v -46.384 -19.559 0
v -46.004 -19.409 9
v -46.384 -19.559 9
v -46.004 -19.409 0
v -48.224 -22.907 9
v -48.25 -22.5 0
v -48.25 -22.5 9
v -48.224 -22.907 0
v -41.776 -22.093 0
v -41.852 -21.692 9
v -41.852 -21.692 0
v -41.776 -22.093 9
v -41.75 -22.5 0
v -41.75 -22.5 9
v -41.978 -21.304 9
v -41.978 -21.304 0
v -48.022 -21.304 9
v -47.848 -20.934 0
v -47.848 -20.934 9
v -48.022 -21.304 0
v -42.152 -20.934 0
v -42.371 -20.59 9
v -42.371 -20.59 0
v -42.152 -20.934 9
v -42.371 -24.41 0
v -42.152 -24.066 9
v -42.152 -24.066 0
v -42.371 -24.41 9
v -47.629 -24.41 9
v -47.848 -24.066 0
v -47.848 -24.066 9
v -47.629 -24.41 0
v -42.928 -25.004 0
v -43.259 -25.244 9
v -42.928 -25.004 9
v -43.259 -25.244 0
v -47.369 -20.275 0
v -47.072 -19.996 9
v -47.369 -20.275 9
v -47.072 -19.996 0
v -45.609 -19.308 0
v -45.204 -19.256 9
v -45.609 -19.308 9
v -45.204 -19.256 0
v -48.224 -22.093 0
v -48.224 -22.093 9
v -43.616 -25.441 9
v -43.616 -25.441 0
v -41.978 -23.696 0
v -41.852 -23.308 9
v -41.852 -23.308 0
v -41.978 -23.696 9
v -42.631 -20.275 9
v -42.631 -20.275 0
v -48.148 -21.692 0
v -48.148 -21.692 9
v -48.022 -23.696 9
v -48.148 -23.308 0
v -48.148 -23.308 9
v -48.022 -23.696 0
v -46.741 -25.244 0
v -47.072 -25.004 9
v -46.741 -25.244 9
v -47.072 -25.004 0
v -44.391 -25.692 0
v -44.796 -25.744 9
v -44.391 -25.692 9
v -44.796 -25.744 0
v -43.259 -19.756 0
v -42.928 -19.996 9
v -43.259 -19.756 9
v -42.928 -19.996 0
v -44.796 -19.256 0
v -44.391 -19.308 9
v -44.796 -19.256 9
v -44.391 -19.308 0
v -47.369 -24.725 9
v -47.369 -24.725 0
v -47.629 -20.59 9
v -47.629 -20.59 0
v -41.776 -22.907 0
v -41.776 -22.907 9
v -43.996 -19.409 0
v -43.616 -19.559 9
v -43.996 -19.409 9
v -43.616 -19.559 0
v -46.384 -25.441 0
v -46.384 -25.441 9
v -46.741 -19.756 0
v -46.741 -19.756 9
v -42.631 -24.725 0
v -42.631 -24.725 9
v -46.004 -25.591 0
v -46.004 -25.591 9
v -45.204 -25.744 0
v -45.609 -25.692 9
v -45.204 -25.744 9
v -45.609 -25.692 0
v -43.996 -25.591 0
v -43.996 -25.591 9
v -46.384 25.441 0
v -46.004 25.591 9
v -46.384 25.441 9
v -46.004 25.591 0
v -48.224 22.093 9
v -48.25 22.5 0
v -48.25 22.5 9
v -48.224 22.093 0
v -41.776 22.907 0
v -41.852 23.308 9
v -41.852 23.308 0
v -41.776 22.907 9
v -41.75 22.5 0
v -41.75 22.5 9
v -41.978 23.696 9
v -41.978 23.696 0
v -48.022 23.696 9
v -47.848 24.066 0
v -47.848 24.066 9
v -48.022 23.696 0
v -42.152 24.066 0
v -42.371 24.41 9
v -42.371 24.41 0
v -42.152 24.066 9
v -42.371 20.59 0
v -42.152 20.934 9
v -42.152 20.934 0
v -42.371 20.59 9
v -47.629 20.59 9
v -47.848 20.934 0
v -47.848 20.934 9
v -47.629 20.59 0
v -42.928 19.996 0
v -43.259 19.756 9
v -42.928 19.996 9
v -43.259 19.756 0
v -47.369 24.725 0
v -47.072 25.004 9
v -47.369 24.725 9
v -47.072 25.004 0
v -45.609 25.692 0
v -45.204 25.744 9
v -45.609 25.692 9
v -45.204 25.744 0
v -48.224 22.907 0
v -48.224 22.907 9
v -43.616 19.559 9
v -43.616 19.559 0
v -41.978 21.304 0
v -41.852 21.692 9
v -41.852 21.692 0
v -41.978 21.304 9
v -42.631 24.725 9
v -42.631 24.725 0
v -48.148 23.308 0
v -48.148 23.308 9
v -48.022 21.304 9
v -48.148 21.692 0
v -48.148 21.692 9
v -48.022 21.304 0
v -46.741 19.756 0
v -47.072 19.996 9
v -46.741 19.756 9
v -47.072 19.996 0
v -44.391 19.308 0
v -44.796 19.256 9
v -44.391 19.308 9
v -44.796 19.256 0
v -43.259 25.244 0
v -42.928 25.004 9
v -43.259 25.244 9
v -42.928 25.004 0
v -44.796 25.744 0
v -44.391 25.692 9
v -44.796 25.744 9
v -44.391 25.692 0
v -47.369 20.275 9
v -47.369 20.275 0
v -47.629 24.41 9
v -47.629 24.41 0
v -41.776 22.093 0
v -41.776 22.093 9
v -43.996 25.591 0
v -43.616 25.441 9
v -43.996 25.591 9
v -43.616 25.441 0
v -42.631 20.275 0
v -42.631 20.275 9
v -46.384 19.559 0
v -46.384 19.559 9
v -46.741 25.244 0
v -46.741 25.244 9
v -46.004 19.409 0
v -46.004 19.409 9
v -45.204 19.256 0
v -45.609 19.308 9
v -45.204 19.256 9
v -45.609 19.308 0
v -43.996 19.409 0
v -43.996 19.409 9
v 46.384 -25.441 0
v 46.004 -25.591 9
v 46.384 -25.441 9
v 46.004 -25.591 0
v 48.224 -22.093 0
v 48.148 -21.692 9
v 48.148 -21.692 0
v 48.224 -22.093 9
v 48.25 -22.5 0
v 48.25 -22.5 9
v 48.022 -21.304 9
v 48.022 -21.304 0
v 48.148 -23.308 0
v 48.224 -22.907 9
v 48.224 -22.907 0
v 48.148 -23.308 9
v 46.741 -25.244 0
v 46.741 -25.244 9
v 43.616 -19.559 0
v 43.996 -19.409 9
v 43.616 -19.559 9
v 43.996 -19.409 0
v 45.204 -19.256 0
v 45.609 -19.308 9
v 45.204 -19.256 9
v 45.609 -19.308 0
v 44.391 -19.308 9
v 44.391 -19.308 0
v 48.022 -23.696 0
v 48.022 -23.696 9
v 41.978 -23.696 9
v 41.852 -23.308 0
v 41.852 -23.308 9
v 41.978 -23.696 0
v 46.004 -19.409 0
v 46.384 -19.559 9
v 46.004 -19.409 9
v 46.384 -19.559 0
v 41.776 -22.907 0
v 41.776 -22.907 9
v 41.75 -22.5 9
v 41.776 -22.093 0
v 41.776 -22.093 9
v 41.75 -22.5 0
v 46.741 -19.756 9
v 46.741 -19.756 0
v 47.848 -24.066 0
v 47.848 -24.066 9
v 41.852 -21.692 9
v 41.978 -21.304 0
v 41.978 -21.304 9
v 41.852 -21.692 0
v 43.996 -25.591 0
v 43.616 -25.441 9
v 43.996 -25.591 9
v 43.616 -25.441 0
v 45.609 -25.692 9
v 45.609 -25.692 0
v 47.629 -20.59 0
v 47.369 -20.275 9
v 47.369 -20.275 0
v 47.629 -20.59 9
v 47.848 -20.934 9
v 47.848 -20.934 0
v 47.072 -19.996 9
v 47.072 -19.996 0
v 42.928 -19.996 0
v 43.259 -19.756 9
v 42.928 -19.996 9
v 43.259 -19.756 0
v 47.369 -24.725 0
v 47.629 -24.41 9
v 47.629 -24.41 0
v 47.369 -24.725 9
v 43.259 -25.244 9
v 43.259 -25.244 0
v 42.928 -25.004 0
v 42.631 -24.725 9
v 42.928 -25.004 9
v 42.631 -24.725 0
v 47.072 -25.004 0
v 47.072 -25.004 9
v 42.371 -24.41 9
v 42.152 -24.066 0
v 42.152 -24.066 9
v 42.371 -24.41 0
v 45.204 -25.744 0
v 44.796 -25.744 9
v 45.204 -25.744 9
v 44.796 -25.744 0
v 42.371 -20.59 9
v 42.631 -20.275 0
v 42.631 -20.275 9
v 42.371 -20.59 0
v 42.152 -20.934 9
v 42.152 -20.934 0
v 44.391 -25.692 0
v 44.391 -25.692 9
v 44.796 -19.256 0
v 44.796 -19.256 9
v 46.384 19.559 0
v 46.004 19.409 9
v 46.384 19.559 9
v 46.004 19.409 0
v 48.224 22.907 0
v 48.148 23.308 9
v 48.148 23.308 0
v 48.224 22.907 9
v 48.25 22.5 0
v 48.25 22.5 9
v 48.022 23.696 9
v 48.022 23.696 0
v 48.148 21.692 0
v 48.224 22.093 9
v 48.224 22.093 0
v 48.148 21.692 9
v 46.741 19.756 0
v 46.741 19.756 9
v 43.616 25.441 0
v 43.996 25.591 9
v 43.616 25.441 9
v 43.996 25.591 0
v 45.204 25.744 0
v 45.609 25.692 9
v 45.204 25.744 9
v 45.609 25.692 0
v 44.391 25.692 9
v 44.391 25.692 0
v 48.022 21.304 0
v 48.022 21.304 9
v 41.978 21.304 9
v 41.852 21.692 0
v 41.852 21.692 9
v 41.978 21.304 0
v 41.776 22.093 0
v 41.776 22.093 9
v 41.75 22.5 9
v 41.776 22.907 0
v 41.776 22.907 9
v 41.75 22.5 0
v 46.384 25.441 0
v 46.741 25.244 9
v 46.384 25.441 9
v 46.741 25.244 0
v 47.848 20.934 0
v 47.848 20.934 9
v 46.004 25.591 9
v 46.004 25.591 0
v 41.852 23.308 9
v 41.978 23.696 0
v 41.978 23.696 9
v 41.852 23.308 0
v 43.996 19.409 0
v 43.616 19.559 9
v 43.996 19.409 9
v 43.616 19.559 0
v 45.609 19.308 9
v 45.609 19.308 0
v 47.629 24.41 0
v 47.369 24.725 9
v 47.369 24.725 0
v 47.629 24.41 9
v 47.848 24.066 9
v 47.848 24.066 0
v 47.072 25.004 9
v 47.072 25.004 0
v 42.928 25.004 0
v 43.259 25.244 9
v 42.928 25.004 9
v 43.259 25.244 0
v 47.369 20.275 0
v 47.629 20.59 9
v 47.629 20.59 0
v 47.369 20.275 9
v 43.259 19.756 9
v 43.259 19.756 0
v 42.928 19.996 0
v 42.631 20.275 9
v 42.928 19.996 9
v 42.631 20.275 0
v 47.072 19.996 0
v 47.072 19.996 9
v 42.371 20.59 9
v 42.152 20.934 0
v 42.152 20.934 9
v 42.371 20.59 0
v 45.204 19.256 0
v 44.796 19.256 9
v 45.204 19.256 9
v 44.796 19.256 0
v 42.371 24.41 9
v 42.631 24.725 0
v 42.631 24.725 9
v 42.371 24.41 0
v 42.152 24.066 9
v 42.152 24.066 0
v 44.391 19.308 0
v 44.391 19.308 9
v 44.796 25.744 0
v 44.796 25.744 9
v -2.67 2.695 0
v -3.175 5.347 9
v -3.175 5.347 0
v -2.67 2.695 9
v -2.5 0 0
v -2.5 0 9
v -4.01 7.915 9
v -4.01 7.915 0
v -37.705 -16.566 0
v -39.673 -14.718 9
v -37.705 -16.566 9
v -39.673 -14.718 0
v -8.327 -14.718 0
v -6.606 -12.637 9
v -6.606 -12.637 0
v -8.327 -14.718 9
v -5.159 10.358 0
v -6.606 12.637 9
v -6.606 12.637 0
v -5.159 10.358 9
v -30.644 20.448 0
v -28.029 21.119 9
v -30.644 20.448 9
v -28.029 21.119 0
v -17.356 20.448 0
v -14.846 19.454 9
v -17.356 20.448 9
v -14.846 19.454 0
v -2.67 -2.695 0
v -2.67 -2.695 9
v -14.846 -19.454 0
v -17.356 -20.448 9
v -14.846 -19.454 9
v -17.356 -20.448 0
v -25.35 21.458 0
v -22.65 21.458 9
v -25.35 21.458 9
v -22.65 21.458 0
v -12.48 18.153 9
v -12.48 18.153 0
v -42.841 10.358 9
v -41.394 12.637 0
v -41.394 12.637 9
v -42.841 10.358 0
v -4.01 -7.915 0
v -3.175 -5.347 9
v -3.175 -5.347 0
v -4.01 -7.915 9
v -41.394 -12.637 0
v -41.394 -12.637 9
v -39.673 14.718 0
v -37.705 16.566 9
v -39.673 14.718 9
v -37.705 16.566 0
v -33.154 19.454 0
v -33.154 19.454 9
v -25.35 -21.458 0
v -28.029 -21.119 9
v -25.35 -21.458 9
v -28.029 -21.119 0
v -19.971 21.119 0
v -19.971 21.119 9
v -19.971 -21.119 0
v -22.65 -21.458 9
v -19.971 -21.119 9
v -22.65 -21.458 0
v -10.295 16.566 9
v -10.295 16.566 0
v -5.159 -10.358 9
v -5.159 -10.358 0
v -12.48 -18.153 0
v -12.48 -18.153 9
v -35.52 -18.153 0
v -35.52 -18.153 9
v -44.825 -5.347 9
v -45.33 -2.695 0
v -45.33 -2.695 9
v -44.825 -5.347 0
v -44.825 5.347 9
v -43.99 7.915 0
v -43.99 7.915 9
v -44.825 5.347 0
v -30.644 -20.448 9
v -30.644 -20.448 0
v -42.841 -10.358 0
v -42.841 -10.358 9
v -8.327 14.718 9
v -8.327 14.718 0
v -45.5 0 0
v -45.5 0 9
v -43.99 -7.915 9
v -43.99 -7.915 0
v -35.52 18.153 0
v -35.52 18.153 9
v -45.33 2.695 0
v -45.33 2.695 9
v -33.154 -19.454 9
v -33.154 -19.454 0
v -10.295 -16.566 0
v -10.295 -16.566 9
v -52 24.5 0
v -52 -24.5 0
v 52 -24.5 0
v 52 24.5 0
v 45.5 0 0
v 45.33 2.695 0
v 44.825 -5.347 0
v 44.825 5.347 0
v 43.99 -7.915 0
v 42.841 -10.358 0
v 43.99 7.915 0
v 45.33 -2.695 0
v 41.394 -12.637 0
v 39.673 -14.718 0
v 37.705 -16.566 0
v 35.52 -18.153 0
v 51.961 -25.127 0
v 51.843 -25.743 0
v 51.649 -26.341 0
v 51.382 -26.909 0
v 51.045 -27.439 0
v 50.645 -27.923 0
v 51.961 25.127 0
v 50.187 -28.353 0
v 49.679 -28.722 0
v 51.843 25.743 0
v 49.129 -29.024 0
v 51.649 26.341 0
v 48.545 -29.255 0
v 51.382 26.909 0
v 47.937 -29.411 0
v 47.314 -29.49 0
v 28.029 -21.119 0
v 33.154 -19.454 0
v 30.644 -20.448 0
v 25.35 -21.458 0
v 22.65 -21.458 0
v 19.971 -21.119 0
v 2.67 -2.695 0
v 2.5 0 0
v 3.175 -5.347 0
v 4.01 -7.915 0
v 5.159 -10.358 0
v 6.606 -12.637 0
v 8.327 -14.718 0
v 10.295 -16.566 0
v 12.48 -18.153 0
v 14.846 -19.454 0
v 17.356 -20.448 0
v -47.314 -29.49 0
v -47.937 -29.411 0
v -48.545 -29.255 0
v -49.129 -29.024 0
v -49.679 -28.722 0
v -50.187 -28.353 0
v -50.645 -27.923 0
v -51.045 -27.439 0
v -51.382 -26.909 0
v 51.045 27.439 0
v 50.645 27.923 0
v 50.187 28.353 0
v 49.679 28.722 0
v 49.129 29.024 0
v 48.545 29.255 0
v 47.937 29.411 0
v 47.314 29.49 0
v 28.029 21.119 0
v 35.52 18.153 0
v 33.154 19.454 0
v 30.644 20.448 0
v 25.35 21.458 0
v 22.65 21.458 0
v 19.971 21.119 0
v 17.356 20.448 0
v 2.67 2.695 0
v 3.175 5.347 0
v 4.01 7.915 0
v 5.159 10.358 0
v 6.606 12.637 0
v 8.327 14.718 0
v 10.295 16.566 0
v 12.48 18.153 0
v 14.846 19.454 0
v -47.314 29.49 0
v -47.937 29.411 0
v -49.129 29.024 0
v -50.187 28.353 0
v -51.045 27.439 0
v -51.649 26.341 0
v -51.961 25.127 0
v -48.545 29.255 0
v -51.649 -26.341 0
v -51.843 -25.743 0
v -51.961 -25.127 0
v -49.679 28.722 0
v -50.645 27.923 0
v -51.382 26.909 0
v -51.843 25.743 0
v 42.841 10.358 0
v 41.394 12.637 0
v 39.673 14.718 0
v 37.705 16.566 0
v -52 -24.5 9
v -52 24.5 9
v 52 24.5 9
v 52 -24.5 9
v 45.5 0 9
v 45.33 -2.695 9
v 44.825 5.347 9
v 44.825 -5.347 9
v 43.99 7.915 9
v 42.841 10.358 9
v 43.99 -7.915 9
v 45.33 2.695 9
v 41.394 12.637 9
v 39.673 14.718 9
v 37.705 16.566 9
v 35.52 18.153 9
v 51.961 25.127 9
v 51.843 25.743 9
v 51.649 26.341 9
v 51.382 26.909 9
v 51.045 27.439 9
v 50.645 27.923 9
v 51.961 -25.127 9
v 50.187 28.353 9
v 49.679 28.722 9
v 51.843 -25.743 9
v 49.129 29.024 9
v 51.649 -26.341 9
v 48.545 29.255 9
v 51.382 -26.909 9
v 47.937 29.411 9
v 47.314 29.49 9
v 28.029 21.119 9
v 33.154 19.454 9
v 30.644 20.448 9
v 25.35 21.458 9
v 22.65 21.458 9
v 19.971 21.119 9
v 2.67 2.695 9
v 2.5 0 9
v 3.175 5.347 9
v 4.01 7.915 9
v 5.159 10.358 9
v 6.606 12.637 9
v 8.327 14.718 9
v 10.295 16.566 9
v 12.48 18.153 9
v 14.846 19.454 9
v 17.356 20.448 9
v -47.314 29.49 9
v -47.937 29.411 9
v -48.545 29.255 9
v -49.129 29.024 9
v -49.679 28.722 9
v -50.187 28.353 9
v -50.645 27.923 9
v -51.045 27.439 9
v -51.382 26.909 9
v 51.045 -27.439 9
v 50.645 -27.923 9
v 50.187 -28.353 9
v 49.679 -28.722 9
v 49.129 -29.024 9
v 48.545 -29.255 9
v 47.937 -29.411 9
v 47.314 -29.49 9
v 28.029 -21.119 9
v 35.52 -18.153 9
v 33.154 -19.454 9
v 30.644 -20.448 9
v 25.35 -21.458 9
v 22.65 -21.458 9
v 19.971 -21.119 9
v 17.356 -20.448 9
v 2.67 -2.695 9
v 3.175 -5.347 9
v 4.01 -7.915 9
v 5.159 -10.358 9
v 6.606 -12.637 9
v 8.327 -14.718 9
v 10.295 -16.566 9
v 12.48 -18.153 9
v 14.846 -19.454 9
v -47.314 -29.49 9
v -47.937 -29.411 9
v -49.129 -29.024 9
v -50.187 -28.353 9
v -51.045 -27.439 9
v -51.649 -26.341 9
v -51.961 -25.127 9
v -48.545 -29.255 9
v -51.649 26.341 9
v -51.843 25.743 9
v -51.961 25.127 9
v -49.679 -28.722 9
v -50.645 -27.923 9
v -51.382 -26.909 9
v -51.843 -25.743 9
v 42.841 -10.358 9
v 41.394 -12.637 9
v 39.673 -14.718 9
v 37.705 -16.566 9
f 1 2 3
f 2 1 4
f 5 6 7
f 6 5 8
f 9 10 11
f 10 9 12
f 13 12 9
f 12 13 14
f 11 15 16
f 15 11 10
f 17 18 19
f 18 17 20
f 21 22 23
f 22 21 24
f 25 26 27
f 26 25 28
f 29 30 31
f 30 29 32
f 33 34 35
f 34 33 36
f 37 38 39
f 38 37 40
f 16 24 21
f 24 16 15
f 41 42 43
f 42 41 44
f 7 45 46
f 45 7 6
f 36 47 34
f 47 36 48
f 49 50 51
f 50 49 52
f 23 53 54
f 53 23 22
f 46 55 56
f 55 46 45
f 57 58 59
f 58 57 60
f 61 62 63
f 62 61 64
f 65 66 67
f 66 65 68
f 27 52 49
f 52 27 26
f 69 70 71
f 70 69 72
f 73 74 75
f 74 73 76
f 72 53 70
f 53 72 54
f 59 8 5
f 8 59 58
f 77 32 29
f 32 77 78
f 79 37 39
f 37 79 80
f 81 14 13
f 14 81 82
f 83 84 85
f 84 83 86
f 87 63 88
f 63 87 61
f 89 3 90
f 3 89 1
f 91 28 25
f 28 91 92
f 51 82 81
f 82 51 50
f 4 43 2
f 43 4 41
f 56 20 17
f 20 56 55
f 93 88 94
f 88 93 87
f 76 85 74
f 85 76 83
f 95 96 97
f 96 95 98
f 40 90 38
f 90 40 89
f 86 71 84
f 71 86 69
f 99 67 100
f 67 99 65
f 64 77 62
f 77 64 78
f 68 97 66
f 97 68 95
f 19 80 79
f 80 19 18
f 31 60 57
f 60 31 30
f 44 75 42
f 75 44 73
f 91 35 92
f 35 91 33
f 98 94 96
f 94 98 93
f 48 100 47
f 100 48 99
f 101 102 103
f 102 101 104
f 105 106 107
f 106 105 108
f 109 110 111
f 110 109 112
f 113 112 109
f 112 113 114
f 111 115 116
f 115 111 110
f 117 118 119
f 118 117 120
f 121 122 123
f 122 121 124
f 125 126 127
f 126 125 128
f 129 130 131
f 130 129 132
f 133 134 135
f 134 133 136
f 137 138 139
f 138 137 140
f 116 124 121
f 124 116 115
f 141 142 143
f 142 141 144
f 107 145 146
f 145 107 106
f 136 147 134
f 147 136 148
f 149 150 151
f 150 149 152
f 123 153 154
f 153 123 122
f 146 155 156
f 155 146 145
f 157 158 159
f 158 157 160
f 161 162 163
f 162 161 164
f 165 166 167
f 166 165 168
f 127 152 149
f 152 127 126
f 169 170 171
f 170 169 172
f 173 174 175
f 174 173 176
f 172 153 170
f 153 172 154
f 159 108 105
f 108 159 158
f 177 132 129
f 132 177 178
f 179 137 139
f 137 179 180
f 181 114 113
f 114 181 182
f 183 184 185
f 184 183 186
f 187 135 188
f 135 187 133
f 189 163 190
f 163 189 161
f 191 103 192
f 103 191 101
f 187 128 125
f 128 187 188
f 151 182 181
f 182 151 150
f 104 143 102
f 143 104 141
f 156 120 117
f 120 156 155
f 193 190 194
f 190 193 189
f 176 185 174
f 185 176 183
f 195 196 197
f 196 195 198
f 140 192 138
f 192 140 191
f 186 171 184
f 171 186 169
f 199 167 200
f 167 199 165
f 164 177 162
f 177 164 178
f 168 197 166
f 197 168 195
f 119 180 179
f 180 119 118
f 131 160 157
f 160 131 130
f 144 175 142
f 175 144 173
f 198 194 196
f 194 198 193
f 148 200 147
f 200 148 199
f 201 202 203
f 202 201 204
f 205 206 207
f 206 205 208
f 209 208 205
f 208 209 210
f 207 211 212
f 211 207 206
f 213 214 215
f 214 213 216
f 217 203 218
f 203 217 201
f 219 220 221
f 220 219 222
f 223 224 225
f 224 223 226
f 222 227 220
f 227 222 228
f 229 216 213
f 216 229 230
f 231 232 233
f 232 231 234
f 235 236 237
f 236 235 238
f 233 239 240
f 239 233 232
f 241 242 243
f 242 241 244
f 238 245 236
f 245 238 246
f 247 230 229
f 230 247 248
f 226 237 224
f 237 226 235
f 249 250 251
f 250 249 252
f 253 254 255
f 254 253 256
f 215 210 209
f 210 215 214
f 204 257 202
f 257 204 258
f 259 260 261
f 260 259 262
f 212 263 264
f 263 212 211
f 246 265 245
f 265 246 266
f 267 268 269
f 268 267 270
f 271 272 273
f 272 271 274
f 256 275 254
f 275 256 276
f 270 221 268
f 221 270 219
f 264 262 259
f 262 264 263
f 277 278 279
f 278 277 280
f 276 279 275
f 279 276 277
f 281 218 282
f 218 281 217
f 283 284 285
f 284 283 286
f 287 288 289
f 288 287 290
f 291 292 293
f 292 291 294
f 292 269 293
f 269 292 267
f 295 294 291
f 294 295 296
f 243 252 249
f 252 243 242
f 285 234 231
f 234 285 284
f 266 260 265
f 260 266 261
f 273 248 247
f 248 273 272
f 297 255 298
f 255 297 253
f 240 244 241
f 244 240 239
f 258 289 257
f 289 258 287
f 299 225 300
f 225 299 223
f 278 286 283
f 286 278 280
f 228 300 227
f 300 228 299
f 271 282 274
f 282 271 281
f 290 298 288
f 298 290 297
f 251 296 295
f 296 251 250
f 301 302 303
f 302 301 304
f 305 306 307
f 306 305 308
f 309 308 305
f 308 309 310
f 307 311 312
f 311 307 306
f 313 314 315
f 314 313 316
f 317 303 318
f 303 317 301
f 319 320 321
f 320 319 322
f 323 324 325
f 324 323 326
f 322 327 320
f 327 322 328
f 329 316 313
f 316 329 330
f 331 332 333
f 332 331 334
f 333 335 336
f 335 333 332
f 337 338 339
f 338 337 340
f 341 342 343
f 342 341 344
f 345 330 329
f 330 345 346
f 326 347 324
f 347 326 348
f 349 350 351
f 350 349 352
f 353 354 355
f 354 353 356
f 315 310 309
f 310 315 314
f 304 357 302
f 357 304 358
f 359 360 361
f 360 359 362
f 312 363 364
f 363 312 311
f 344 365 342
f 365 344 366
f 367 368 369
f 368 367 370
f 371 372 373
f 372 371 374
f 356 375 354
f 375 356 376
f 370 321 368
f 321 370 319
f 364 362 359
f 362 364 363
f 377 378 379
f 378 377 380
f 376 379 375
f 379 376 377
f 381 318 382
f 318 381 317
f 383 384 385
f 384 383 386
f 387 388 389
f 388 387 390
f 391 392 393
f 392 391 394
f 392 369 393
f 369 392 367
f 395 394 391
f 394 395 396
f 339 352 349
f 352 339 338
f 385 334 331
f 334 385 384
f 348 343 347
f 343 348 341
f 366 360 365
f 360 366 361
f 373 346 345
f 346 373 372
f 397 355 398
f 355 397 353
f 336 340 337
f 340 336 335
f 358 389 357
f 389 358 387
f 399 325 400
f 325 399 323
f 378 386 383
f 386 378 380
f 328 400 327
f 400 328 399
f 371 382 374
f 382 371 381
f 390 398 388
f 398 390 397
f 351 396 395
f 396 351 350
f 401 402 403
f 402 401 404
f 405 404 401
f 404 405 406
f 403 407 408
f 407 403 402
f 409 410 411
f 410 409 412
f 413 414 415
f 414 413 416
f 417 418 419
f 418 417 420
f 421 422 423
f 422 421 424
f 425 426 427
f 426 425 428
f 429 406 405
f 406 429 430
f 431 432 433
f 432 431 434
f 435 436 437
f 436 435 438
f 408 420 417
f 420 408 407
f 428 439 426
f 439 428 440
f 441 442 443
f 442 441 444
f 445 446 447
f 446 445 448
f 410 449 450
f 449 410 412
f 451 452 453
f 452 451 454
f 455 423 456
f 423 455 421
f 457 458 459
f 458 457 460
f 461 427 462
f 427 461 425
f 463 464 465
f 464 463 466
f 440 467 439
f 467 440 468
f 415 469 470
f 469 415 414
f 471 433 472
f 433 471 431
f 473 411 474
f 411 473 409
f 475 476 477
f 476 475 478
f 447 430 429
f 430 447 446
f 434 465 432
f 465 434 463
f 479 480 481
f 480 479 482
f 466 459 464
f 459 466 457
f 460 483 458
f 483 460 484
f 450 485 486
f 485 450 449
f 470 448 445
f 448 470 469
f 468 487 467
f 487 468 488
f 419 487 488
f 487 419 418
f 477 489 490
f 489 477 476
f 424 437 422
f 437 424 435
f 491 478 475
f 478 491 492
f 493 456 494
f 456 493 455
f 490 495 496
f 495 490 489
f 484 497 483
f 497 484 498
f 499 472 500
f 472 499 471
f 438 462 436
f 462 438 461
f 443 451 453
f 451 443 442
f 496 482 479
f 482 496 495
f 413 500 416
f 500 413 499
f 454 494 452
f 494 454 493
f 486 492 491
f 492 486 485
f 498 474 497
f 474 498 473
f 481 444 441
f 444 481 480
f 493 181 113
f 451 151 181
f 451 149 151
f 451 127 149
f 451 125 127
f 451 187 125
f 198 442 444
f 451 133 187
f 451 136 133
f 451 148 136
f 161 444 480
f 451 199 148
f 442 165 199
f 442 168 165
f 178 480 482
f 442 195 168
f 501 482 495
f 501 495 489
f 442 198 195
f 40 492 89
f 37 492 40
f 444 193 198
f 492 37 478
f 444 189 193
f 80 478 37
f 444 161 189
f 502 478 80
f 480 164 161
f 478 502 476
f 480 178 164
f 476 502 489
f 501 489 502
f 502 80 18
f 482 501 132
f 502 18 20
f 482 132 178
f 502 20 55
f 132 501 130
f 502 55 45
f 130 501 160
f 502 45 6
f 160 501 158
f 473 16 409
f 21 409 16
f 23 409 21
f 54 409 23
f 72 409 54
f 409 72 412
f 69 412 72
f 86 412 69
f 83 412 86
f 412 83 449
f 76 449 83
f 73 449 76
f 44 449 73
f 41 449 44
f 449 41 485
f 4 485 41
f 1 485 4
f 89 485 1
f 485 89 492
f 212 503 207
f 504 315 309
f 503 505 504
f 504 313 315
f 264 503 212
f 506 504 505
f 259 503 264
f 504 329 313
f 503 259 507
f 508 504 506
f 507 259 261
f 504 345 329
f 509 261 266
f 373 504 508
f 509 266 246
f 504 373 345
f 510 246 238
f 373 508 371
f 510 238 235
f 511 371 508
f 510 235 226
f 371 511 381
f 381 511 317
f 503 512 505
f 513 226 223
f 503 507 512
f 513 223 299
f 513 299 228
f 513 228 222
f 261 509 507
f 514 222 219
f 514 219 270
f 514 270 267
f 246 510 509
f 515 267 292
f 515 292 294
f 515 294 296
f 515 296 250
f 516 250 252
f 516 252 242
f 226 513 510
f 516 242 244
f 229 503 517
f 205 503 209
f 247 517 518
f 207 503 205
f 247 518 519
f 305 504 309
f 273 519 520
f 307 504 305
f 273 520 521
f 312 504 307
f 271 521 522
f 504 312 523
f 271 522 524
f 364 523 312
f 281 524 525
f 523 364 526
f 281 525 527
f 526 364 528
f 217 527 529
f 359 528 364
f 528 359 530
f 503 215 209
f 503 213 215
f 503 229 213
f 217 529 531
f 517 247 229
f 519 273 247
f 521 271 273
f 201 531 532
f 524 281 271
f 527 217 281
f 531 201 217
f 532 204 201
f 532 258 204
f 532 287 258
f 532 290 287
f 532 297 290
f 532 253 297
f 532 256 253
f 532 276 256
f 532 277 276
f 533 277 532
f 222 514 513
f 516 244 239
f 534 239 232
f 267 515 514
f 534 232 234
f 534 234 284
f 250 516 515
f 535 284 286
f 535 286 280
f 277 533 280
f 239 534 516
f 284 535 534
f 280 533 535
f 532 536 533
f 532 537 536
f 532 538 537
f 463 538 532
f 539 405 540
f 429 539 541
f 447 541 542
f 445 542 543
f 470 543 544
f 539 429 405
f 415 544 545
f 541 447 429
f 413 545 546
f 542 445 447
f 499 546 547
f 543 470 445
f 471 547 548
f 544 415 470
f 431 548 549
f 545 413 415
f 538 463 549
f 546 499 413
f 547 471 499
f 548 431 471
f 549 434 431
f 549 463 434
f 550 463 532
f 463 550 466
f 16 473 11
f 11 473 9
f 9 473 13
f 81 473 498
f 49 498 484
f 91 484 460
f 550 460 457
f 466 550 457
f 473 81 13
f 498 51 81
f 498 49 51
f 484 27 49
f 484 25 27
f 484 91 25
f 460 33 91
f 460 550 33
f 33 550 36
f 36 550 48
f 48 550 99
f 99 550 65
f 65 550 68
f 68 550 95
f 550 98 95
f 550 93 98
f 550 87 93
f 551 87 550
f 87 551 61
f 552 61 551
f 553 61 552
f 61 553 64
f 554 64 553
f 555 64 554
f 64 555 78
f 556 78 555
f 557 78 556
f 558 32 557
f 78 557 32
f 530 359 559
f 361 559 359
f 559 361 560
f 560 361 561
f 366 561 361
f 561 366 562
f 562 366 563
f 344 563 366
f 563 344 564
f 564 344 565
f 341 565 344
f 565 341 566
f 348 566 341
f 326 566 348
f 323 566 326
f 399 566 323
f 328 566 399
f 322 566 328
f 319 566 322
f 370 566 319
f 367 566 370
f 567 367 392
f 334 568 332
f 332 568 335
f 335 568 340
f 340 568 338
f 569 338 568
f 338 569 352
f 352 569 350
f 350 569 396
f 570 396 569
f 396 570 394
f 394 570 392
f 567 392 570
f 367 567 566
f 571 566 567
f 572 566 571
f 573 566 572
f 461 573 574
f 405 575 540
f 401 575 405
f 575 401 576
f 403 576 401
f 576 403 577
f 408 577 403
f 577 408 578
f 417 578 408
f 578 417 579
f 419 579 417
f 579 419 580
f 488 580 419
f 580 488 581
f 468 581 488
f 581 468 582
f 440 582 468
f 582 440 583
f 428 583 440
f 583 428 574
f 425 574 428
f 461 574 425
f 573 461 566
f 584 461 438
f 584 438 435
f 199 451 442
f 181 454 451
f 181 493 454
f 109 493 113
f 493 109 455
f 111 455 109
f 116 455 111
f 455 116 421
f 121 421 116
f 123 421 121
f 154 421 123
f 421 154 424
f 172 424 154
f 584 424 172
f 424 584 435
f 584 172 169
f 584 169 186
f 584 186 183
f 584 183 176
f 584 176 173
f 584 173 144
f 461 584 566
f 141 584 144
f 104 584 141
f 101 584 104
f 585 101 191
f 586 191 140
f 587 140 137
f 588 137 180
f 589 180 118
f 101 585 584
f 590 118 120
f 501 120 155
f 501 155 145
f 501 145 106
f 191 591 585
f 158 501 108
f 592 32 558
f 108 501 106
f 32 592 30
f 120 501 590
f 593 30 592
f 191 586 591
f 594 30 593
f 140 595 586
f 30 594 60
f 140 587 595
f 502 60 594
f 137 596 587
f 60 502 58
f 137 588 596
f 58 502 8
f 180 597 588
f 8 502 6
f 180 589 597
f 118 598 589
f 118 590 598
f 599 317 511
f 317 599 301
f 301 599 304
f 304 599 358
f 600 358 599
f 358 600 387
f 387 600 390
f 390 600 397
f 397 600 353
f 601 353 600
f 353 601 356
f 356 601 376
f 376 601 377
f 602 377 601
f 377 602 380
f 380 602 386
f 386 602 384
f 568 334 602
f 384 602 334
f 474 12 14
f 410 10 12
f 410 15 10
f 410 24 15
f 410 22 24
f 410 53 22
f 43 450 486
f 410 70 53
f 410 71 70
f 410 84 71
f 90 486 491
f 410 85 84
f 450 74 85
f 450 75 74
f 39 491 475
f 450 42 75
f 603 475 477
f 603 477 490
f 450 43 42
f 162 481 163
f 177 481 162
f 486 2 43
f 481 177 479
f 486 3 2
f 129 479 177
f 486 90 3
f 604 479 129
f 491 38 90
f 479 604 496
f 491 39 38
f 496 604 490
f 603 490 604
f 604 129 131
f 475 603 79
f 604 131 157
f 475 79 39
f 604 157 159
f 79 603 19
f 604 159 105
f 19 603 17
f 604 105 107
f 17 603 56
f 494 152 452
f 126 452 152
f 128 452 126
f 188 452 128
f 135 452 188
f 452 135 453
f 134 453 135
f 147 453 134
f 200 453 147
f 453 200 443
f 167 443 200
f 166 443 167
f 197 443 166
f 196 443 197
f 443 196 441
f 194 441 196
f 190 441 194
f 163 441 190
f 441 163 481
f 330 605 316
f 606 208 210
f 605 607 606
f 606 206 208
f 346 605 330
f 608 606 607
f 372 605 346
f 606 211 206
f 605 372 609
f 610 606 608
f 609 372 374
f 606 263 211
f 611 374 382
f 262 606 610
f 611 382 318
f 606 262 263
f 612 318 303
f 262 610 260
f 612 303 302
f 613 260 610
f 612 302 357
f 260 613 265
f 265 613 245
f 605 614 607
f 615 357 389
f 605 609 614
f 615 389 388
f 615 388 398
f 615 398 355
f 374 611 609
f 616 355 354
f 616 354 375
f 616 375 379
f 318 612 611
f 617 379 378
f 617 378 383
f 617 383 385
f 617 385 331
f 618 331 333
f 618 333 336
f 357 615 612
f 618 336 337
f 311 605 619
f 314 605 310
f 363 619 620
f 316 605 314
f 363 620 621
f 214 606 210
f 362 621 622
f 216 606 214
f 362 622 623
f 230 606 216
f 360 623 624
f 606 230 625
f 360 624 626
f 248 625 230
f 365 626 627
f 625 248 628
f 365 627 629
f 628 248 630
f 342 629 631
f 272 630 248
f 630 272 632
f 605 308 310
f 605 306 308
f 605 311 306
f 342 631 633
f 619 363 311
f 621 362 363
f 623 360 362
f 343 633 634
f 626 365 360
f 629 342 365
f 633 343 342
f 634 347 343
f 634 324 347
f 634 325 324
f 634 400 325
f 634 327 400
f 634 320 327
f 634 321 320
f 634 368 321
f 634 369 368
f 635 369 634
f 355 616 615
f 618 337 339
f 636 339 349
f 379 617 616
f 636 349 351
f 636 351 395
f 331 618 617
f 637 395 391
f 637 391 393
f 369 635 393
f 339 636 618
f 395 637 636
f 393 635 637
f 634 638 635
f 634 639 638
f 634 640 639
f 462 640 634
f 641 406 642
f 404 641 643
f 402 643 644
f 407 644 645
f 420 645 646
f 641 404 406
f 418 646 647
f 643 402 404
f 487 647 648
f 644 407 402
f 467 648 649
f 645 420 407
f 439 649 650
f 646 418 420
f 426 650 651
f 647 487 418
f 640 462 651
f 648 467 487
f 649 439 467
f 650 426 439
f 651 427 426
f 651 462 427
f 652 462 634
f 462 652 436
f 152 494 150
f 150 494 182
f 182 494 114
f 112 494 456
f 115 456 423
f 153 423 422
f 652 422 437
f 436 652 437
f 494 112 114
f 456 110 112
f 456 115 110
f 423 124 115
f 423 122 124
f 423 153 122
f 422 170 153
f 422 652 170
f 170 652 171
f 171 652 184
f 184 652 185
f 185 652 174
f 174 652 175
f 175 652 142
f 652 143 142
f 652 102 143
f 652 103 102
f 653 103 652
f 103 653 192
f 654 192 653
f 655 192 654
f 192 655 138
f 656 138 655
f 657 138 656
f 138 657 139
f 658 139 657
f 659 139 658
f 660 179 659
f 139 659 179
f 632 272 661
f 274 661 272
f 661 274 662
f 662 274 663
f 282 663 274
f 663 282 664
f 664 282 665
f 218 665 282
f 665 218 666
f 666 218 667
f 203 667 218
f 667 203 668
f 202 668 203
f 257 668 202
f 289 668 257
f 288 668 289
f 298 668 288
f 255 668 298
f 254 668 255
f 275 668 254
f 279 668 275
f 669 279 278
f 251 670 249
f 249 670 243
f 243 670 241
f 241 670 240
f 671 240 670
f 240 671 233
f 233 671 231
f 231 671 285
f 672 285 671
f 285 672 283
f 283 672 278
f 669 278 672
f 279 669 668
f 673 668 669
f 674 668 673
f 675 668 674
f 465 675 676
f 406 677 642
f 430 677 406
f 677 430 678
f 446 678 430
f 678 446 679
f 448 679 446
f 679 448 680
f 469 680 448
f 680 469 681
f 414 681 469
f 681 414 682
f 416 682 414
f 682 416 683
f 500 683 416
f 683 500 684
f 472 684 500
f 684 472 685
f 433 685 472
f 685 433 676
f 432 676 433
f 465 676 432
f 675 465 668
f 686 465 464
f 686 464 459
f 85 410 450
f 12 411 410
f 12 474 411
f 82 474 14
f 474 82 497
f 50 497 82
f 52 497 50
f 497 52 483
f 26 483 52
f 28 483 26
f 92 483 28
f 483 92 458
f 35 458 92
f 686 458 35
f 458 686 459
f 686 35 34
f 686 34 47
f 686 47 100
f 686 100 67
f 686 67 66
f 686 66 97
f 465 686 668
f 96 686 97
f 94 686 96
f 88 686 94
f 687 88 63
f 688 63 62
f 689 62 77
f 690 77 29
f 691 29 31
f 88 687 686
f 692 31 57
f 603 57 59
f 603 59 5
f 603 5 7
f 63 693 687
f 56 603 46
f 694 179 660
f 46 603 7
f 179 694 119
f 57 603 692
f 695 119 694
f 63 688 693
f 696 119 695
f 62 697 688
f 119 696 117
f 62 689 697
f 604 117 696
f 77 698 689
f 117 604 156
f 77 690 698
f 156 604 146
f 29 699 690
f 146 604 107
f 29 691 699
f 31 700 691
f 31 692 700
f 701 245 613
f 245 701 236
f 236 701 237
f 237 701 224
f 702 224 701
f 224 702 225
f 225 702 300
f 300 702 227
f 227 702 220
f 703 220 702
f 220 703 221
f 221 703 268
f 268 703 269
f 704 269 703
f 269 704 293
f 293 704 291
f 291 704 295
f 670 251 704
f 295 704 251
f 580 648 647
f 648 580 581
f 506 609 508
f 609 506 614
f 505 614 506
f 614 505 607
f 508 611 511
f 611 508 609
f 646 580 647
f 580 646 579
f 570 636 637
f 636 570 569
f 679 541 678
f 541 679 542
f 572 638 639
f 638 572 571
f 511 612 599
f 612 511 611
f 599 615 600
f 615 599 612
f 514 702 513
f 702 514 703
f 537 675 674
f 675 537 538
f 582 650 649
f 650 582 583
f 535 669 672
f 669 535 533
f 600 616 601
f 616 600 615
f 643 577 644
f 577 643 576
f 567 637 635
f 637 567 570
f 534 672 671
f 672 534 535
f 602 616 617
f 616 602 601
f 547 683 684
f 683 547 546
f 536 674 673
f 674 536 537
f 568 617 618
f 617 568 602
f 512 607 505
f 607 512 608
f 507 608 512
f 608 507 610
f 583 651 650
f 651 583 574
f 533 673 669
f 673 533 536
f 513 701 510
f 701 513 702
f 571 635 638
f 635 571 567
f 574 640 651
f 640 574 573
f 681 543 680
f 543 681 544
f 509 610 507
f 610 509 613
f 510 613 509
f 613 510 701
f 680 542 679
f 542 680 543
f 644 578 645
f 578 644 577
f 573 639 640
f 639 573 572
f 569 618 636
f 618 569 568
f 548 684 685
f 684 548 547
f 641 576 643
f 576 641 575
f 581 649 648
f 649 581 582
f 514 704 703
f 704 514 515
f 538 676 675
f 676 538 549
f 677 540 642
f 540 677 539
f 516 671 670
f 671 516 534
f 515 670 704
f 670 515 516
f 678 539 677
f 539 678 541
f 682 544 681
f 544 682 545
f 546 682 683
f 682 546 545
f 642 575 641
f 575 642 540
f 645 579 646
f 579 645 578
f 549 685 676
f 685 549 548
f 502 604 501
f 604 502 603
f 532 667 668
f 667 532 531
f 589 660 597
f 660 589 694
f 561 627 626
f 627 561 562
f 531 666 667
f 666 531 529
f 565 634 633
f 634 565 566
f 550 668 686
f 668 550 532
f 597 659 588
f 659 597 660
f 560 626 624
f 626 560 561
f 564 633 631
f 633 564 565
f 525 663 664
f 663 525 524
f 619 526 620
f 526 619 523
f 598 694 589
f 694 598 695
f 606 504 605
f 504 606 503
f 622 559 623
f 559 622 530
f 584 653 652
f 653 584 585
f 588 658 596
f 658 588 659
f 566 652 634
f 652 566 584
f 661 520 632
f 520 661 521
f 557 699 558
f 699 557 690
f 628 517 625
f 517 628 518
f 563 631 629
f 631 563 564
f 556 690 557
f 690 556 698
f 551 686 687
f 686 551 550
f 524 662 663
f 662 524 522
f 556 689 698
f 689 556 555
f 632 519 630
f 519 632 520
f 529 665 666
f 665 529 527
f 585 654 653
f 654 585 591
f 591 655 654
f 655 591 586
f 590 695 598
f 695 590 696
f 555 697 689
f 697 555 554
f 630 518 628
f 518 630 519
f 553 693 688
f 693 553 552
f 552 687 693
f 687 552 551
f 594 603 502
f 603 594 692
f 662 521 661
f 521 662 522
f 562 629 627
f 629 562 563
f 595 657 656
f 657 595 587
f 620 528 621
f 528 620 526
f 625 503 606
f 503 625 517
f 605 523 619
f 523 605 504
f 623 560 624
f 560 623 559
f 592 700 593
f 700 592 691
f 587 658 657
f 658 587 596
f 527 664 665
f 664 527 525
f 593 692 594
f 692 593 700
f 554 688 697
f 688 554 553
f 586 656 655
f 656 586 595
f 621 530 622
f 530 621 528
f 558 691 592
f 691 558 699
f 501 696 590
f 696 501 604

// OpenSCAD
$fn = 50;

difference() {
	union() {
		hull() {
			translate(v = [-47.0, 24.5, 0]) {
				cylinder(h = 9, r = 5);
			}
			translate(v = [47.0, 24.5, 0]) {
				cylinder(h = 9, r = 5);
			}
			translate(v = [-47.0, -24.5, 0]) {
				cylinder(h = 9, r = 5);
			}
			translate(v = [47.0, -24.5, 0]) {
				cylinder(h = 9, r = 5);
			}
		}
	}
	union() {
		translate(v = [-45.0, -22.5, -100.0]) {
			cylinder(h = 200, r = 3.25);
		}
		translate(v = [-45.0, 22.5, -100.0]) {
			cylinder(h = 200, r = 3.25);
		}
		translate(v = [45.0, -22.5, -100.0]) {
			cylinder(h = 200, r = 3.25);
		}
		translate(v = [45.0, 22.5, -100.0]) {
			cylinder(h = 200, r = 3.25);
		}
		translate(v = [-45.0, -22.5, -100.0]) {
			cylinder(h = 200, r = 1.8);
		}
		translate(v = [-45.0, 22.5, -100.0]) {
			cylinder(h = 200, r = 1.8);
		}
		translate(v = [45.0, -22.5, -100.0]) {
			cylinder(h = 200, r = 1.8);
		}
		translate(v = [45.0, 22.5, -100.0]) {
			cylinder(h = 200, r = 1.8);
		}
		translate(v = [-24.0, 0, 0.0]) {
			cylinder(h = 9, r = 21.5);
		}
		translate(v = [24.0, 0, 0.0]) {
			cylinder(h = 9, r = 21.5);
		}
	}
}
